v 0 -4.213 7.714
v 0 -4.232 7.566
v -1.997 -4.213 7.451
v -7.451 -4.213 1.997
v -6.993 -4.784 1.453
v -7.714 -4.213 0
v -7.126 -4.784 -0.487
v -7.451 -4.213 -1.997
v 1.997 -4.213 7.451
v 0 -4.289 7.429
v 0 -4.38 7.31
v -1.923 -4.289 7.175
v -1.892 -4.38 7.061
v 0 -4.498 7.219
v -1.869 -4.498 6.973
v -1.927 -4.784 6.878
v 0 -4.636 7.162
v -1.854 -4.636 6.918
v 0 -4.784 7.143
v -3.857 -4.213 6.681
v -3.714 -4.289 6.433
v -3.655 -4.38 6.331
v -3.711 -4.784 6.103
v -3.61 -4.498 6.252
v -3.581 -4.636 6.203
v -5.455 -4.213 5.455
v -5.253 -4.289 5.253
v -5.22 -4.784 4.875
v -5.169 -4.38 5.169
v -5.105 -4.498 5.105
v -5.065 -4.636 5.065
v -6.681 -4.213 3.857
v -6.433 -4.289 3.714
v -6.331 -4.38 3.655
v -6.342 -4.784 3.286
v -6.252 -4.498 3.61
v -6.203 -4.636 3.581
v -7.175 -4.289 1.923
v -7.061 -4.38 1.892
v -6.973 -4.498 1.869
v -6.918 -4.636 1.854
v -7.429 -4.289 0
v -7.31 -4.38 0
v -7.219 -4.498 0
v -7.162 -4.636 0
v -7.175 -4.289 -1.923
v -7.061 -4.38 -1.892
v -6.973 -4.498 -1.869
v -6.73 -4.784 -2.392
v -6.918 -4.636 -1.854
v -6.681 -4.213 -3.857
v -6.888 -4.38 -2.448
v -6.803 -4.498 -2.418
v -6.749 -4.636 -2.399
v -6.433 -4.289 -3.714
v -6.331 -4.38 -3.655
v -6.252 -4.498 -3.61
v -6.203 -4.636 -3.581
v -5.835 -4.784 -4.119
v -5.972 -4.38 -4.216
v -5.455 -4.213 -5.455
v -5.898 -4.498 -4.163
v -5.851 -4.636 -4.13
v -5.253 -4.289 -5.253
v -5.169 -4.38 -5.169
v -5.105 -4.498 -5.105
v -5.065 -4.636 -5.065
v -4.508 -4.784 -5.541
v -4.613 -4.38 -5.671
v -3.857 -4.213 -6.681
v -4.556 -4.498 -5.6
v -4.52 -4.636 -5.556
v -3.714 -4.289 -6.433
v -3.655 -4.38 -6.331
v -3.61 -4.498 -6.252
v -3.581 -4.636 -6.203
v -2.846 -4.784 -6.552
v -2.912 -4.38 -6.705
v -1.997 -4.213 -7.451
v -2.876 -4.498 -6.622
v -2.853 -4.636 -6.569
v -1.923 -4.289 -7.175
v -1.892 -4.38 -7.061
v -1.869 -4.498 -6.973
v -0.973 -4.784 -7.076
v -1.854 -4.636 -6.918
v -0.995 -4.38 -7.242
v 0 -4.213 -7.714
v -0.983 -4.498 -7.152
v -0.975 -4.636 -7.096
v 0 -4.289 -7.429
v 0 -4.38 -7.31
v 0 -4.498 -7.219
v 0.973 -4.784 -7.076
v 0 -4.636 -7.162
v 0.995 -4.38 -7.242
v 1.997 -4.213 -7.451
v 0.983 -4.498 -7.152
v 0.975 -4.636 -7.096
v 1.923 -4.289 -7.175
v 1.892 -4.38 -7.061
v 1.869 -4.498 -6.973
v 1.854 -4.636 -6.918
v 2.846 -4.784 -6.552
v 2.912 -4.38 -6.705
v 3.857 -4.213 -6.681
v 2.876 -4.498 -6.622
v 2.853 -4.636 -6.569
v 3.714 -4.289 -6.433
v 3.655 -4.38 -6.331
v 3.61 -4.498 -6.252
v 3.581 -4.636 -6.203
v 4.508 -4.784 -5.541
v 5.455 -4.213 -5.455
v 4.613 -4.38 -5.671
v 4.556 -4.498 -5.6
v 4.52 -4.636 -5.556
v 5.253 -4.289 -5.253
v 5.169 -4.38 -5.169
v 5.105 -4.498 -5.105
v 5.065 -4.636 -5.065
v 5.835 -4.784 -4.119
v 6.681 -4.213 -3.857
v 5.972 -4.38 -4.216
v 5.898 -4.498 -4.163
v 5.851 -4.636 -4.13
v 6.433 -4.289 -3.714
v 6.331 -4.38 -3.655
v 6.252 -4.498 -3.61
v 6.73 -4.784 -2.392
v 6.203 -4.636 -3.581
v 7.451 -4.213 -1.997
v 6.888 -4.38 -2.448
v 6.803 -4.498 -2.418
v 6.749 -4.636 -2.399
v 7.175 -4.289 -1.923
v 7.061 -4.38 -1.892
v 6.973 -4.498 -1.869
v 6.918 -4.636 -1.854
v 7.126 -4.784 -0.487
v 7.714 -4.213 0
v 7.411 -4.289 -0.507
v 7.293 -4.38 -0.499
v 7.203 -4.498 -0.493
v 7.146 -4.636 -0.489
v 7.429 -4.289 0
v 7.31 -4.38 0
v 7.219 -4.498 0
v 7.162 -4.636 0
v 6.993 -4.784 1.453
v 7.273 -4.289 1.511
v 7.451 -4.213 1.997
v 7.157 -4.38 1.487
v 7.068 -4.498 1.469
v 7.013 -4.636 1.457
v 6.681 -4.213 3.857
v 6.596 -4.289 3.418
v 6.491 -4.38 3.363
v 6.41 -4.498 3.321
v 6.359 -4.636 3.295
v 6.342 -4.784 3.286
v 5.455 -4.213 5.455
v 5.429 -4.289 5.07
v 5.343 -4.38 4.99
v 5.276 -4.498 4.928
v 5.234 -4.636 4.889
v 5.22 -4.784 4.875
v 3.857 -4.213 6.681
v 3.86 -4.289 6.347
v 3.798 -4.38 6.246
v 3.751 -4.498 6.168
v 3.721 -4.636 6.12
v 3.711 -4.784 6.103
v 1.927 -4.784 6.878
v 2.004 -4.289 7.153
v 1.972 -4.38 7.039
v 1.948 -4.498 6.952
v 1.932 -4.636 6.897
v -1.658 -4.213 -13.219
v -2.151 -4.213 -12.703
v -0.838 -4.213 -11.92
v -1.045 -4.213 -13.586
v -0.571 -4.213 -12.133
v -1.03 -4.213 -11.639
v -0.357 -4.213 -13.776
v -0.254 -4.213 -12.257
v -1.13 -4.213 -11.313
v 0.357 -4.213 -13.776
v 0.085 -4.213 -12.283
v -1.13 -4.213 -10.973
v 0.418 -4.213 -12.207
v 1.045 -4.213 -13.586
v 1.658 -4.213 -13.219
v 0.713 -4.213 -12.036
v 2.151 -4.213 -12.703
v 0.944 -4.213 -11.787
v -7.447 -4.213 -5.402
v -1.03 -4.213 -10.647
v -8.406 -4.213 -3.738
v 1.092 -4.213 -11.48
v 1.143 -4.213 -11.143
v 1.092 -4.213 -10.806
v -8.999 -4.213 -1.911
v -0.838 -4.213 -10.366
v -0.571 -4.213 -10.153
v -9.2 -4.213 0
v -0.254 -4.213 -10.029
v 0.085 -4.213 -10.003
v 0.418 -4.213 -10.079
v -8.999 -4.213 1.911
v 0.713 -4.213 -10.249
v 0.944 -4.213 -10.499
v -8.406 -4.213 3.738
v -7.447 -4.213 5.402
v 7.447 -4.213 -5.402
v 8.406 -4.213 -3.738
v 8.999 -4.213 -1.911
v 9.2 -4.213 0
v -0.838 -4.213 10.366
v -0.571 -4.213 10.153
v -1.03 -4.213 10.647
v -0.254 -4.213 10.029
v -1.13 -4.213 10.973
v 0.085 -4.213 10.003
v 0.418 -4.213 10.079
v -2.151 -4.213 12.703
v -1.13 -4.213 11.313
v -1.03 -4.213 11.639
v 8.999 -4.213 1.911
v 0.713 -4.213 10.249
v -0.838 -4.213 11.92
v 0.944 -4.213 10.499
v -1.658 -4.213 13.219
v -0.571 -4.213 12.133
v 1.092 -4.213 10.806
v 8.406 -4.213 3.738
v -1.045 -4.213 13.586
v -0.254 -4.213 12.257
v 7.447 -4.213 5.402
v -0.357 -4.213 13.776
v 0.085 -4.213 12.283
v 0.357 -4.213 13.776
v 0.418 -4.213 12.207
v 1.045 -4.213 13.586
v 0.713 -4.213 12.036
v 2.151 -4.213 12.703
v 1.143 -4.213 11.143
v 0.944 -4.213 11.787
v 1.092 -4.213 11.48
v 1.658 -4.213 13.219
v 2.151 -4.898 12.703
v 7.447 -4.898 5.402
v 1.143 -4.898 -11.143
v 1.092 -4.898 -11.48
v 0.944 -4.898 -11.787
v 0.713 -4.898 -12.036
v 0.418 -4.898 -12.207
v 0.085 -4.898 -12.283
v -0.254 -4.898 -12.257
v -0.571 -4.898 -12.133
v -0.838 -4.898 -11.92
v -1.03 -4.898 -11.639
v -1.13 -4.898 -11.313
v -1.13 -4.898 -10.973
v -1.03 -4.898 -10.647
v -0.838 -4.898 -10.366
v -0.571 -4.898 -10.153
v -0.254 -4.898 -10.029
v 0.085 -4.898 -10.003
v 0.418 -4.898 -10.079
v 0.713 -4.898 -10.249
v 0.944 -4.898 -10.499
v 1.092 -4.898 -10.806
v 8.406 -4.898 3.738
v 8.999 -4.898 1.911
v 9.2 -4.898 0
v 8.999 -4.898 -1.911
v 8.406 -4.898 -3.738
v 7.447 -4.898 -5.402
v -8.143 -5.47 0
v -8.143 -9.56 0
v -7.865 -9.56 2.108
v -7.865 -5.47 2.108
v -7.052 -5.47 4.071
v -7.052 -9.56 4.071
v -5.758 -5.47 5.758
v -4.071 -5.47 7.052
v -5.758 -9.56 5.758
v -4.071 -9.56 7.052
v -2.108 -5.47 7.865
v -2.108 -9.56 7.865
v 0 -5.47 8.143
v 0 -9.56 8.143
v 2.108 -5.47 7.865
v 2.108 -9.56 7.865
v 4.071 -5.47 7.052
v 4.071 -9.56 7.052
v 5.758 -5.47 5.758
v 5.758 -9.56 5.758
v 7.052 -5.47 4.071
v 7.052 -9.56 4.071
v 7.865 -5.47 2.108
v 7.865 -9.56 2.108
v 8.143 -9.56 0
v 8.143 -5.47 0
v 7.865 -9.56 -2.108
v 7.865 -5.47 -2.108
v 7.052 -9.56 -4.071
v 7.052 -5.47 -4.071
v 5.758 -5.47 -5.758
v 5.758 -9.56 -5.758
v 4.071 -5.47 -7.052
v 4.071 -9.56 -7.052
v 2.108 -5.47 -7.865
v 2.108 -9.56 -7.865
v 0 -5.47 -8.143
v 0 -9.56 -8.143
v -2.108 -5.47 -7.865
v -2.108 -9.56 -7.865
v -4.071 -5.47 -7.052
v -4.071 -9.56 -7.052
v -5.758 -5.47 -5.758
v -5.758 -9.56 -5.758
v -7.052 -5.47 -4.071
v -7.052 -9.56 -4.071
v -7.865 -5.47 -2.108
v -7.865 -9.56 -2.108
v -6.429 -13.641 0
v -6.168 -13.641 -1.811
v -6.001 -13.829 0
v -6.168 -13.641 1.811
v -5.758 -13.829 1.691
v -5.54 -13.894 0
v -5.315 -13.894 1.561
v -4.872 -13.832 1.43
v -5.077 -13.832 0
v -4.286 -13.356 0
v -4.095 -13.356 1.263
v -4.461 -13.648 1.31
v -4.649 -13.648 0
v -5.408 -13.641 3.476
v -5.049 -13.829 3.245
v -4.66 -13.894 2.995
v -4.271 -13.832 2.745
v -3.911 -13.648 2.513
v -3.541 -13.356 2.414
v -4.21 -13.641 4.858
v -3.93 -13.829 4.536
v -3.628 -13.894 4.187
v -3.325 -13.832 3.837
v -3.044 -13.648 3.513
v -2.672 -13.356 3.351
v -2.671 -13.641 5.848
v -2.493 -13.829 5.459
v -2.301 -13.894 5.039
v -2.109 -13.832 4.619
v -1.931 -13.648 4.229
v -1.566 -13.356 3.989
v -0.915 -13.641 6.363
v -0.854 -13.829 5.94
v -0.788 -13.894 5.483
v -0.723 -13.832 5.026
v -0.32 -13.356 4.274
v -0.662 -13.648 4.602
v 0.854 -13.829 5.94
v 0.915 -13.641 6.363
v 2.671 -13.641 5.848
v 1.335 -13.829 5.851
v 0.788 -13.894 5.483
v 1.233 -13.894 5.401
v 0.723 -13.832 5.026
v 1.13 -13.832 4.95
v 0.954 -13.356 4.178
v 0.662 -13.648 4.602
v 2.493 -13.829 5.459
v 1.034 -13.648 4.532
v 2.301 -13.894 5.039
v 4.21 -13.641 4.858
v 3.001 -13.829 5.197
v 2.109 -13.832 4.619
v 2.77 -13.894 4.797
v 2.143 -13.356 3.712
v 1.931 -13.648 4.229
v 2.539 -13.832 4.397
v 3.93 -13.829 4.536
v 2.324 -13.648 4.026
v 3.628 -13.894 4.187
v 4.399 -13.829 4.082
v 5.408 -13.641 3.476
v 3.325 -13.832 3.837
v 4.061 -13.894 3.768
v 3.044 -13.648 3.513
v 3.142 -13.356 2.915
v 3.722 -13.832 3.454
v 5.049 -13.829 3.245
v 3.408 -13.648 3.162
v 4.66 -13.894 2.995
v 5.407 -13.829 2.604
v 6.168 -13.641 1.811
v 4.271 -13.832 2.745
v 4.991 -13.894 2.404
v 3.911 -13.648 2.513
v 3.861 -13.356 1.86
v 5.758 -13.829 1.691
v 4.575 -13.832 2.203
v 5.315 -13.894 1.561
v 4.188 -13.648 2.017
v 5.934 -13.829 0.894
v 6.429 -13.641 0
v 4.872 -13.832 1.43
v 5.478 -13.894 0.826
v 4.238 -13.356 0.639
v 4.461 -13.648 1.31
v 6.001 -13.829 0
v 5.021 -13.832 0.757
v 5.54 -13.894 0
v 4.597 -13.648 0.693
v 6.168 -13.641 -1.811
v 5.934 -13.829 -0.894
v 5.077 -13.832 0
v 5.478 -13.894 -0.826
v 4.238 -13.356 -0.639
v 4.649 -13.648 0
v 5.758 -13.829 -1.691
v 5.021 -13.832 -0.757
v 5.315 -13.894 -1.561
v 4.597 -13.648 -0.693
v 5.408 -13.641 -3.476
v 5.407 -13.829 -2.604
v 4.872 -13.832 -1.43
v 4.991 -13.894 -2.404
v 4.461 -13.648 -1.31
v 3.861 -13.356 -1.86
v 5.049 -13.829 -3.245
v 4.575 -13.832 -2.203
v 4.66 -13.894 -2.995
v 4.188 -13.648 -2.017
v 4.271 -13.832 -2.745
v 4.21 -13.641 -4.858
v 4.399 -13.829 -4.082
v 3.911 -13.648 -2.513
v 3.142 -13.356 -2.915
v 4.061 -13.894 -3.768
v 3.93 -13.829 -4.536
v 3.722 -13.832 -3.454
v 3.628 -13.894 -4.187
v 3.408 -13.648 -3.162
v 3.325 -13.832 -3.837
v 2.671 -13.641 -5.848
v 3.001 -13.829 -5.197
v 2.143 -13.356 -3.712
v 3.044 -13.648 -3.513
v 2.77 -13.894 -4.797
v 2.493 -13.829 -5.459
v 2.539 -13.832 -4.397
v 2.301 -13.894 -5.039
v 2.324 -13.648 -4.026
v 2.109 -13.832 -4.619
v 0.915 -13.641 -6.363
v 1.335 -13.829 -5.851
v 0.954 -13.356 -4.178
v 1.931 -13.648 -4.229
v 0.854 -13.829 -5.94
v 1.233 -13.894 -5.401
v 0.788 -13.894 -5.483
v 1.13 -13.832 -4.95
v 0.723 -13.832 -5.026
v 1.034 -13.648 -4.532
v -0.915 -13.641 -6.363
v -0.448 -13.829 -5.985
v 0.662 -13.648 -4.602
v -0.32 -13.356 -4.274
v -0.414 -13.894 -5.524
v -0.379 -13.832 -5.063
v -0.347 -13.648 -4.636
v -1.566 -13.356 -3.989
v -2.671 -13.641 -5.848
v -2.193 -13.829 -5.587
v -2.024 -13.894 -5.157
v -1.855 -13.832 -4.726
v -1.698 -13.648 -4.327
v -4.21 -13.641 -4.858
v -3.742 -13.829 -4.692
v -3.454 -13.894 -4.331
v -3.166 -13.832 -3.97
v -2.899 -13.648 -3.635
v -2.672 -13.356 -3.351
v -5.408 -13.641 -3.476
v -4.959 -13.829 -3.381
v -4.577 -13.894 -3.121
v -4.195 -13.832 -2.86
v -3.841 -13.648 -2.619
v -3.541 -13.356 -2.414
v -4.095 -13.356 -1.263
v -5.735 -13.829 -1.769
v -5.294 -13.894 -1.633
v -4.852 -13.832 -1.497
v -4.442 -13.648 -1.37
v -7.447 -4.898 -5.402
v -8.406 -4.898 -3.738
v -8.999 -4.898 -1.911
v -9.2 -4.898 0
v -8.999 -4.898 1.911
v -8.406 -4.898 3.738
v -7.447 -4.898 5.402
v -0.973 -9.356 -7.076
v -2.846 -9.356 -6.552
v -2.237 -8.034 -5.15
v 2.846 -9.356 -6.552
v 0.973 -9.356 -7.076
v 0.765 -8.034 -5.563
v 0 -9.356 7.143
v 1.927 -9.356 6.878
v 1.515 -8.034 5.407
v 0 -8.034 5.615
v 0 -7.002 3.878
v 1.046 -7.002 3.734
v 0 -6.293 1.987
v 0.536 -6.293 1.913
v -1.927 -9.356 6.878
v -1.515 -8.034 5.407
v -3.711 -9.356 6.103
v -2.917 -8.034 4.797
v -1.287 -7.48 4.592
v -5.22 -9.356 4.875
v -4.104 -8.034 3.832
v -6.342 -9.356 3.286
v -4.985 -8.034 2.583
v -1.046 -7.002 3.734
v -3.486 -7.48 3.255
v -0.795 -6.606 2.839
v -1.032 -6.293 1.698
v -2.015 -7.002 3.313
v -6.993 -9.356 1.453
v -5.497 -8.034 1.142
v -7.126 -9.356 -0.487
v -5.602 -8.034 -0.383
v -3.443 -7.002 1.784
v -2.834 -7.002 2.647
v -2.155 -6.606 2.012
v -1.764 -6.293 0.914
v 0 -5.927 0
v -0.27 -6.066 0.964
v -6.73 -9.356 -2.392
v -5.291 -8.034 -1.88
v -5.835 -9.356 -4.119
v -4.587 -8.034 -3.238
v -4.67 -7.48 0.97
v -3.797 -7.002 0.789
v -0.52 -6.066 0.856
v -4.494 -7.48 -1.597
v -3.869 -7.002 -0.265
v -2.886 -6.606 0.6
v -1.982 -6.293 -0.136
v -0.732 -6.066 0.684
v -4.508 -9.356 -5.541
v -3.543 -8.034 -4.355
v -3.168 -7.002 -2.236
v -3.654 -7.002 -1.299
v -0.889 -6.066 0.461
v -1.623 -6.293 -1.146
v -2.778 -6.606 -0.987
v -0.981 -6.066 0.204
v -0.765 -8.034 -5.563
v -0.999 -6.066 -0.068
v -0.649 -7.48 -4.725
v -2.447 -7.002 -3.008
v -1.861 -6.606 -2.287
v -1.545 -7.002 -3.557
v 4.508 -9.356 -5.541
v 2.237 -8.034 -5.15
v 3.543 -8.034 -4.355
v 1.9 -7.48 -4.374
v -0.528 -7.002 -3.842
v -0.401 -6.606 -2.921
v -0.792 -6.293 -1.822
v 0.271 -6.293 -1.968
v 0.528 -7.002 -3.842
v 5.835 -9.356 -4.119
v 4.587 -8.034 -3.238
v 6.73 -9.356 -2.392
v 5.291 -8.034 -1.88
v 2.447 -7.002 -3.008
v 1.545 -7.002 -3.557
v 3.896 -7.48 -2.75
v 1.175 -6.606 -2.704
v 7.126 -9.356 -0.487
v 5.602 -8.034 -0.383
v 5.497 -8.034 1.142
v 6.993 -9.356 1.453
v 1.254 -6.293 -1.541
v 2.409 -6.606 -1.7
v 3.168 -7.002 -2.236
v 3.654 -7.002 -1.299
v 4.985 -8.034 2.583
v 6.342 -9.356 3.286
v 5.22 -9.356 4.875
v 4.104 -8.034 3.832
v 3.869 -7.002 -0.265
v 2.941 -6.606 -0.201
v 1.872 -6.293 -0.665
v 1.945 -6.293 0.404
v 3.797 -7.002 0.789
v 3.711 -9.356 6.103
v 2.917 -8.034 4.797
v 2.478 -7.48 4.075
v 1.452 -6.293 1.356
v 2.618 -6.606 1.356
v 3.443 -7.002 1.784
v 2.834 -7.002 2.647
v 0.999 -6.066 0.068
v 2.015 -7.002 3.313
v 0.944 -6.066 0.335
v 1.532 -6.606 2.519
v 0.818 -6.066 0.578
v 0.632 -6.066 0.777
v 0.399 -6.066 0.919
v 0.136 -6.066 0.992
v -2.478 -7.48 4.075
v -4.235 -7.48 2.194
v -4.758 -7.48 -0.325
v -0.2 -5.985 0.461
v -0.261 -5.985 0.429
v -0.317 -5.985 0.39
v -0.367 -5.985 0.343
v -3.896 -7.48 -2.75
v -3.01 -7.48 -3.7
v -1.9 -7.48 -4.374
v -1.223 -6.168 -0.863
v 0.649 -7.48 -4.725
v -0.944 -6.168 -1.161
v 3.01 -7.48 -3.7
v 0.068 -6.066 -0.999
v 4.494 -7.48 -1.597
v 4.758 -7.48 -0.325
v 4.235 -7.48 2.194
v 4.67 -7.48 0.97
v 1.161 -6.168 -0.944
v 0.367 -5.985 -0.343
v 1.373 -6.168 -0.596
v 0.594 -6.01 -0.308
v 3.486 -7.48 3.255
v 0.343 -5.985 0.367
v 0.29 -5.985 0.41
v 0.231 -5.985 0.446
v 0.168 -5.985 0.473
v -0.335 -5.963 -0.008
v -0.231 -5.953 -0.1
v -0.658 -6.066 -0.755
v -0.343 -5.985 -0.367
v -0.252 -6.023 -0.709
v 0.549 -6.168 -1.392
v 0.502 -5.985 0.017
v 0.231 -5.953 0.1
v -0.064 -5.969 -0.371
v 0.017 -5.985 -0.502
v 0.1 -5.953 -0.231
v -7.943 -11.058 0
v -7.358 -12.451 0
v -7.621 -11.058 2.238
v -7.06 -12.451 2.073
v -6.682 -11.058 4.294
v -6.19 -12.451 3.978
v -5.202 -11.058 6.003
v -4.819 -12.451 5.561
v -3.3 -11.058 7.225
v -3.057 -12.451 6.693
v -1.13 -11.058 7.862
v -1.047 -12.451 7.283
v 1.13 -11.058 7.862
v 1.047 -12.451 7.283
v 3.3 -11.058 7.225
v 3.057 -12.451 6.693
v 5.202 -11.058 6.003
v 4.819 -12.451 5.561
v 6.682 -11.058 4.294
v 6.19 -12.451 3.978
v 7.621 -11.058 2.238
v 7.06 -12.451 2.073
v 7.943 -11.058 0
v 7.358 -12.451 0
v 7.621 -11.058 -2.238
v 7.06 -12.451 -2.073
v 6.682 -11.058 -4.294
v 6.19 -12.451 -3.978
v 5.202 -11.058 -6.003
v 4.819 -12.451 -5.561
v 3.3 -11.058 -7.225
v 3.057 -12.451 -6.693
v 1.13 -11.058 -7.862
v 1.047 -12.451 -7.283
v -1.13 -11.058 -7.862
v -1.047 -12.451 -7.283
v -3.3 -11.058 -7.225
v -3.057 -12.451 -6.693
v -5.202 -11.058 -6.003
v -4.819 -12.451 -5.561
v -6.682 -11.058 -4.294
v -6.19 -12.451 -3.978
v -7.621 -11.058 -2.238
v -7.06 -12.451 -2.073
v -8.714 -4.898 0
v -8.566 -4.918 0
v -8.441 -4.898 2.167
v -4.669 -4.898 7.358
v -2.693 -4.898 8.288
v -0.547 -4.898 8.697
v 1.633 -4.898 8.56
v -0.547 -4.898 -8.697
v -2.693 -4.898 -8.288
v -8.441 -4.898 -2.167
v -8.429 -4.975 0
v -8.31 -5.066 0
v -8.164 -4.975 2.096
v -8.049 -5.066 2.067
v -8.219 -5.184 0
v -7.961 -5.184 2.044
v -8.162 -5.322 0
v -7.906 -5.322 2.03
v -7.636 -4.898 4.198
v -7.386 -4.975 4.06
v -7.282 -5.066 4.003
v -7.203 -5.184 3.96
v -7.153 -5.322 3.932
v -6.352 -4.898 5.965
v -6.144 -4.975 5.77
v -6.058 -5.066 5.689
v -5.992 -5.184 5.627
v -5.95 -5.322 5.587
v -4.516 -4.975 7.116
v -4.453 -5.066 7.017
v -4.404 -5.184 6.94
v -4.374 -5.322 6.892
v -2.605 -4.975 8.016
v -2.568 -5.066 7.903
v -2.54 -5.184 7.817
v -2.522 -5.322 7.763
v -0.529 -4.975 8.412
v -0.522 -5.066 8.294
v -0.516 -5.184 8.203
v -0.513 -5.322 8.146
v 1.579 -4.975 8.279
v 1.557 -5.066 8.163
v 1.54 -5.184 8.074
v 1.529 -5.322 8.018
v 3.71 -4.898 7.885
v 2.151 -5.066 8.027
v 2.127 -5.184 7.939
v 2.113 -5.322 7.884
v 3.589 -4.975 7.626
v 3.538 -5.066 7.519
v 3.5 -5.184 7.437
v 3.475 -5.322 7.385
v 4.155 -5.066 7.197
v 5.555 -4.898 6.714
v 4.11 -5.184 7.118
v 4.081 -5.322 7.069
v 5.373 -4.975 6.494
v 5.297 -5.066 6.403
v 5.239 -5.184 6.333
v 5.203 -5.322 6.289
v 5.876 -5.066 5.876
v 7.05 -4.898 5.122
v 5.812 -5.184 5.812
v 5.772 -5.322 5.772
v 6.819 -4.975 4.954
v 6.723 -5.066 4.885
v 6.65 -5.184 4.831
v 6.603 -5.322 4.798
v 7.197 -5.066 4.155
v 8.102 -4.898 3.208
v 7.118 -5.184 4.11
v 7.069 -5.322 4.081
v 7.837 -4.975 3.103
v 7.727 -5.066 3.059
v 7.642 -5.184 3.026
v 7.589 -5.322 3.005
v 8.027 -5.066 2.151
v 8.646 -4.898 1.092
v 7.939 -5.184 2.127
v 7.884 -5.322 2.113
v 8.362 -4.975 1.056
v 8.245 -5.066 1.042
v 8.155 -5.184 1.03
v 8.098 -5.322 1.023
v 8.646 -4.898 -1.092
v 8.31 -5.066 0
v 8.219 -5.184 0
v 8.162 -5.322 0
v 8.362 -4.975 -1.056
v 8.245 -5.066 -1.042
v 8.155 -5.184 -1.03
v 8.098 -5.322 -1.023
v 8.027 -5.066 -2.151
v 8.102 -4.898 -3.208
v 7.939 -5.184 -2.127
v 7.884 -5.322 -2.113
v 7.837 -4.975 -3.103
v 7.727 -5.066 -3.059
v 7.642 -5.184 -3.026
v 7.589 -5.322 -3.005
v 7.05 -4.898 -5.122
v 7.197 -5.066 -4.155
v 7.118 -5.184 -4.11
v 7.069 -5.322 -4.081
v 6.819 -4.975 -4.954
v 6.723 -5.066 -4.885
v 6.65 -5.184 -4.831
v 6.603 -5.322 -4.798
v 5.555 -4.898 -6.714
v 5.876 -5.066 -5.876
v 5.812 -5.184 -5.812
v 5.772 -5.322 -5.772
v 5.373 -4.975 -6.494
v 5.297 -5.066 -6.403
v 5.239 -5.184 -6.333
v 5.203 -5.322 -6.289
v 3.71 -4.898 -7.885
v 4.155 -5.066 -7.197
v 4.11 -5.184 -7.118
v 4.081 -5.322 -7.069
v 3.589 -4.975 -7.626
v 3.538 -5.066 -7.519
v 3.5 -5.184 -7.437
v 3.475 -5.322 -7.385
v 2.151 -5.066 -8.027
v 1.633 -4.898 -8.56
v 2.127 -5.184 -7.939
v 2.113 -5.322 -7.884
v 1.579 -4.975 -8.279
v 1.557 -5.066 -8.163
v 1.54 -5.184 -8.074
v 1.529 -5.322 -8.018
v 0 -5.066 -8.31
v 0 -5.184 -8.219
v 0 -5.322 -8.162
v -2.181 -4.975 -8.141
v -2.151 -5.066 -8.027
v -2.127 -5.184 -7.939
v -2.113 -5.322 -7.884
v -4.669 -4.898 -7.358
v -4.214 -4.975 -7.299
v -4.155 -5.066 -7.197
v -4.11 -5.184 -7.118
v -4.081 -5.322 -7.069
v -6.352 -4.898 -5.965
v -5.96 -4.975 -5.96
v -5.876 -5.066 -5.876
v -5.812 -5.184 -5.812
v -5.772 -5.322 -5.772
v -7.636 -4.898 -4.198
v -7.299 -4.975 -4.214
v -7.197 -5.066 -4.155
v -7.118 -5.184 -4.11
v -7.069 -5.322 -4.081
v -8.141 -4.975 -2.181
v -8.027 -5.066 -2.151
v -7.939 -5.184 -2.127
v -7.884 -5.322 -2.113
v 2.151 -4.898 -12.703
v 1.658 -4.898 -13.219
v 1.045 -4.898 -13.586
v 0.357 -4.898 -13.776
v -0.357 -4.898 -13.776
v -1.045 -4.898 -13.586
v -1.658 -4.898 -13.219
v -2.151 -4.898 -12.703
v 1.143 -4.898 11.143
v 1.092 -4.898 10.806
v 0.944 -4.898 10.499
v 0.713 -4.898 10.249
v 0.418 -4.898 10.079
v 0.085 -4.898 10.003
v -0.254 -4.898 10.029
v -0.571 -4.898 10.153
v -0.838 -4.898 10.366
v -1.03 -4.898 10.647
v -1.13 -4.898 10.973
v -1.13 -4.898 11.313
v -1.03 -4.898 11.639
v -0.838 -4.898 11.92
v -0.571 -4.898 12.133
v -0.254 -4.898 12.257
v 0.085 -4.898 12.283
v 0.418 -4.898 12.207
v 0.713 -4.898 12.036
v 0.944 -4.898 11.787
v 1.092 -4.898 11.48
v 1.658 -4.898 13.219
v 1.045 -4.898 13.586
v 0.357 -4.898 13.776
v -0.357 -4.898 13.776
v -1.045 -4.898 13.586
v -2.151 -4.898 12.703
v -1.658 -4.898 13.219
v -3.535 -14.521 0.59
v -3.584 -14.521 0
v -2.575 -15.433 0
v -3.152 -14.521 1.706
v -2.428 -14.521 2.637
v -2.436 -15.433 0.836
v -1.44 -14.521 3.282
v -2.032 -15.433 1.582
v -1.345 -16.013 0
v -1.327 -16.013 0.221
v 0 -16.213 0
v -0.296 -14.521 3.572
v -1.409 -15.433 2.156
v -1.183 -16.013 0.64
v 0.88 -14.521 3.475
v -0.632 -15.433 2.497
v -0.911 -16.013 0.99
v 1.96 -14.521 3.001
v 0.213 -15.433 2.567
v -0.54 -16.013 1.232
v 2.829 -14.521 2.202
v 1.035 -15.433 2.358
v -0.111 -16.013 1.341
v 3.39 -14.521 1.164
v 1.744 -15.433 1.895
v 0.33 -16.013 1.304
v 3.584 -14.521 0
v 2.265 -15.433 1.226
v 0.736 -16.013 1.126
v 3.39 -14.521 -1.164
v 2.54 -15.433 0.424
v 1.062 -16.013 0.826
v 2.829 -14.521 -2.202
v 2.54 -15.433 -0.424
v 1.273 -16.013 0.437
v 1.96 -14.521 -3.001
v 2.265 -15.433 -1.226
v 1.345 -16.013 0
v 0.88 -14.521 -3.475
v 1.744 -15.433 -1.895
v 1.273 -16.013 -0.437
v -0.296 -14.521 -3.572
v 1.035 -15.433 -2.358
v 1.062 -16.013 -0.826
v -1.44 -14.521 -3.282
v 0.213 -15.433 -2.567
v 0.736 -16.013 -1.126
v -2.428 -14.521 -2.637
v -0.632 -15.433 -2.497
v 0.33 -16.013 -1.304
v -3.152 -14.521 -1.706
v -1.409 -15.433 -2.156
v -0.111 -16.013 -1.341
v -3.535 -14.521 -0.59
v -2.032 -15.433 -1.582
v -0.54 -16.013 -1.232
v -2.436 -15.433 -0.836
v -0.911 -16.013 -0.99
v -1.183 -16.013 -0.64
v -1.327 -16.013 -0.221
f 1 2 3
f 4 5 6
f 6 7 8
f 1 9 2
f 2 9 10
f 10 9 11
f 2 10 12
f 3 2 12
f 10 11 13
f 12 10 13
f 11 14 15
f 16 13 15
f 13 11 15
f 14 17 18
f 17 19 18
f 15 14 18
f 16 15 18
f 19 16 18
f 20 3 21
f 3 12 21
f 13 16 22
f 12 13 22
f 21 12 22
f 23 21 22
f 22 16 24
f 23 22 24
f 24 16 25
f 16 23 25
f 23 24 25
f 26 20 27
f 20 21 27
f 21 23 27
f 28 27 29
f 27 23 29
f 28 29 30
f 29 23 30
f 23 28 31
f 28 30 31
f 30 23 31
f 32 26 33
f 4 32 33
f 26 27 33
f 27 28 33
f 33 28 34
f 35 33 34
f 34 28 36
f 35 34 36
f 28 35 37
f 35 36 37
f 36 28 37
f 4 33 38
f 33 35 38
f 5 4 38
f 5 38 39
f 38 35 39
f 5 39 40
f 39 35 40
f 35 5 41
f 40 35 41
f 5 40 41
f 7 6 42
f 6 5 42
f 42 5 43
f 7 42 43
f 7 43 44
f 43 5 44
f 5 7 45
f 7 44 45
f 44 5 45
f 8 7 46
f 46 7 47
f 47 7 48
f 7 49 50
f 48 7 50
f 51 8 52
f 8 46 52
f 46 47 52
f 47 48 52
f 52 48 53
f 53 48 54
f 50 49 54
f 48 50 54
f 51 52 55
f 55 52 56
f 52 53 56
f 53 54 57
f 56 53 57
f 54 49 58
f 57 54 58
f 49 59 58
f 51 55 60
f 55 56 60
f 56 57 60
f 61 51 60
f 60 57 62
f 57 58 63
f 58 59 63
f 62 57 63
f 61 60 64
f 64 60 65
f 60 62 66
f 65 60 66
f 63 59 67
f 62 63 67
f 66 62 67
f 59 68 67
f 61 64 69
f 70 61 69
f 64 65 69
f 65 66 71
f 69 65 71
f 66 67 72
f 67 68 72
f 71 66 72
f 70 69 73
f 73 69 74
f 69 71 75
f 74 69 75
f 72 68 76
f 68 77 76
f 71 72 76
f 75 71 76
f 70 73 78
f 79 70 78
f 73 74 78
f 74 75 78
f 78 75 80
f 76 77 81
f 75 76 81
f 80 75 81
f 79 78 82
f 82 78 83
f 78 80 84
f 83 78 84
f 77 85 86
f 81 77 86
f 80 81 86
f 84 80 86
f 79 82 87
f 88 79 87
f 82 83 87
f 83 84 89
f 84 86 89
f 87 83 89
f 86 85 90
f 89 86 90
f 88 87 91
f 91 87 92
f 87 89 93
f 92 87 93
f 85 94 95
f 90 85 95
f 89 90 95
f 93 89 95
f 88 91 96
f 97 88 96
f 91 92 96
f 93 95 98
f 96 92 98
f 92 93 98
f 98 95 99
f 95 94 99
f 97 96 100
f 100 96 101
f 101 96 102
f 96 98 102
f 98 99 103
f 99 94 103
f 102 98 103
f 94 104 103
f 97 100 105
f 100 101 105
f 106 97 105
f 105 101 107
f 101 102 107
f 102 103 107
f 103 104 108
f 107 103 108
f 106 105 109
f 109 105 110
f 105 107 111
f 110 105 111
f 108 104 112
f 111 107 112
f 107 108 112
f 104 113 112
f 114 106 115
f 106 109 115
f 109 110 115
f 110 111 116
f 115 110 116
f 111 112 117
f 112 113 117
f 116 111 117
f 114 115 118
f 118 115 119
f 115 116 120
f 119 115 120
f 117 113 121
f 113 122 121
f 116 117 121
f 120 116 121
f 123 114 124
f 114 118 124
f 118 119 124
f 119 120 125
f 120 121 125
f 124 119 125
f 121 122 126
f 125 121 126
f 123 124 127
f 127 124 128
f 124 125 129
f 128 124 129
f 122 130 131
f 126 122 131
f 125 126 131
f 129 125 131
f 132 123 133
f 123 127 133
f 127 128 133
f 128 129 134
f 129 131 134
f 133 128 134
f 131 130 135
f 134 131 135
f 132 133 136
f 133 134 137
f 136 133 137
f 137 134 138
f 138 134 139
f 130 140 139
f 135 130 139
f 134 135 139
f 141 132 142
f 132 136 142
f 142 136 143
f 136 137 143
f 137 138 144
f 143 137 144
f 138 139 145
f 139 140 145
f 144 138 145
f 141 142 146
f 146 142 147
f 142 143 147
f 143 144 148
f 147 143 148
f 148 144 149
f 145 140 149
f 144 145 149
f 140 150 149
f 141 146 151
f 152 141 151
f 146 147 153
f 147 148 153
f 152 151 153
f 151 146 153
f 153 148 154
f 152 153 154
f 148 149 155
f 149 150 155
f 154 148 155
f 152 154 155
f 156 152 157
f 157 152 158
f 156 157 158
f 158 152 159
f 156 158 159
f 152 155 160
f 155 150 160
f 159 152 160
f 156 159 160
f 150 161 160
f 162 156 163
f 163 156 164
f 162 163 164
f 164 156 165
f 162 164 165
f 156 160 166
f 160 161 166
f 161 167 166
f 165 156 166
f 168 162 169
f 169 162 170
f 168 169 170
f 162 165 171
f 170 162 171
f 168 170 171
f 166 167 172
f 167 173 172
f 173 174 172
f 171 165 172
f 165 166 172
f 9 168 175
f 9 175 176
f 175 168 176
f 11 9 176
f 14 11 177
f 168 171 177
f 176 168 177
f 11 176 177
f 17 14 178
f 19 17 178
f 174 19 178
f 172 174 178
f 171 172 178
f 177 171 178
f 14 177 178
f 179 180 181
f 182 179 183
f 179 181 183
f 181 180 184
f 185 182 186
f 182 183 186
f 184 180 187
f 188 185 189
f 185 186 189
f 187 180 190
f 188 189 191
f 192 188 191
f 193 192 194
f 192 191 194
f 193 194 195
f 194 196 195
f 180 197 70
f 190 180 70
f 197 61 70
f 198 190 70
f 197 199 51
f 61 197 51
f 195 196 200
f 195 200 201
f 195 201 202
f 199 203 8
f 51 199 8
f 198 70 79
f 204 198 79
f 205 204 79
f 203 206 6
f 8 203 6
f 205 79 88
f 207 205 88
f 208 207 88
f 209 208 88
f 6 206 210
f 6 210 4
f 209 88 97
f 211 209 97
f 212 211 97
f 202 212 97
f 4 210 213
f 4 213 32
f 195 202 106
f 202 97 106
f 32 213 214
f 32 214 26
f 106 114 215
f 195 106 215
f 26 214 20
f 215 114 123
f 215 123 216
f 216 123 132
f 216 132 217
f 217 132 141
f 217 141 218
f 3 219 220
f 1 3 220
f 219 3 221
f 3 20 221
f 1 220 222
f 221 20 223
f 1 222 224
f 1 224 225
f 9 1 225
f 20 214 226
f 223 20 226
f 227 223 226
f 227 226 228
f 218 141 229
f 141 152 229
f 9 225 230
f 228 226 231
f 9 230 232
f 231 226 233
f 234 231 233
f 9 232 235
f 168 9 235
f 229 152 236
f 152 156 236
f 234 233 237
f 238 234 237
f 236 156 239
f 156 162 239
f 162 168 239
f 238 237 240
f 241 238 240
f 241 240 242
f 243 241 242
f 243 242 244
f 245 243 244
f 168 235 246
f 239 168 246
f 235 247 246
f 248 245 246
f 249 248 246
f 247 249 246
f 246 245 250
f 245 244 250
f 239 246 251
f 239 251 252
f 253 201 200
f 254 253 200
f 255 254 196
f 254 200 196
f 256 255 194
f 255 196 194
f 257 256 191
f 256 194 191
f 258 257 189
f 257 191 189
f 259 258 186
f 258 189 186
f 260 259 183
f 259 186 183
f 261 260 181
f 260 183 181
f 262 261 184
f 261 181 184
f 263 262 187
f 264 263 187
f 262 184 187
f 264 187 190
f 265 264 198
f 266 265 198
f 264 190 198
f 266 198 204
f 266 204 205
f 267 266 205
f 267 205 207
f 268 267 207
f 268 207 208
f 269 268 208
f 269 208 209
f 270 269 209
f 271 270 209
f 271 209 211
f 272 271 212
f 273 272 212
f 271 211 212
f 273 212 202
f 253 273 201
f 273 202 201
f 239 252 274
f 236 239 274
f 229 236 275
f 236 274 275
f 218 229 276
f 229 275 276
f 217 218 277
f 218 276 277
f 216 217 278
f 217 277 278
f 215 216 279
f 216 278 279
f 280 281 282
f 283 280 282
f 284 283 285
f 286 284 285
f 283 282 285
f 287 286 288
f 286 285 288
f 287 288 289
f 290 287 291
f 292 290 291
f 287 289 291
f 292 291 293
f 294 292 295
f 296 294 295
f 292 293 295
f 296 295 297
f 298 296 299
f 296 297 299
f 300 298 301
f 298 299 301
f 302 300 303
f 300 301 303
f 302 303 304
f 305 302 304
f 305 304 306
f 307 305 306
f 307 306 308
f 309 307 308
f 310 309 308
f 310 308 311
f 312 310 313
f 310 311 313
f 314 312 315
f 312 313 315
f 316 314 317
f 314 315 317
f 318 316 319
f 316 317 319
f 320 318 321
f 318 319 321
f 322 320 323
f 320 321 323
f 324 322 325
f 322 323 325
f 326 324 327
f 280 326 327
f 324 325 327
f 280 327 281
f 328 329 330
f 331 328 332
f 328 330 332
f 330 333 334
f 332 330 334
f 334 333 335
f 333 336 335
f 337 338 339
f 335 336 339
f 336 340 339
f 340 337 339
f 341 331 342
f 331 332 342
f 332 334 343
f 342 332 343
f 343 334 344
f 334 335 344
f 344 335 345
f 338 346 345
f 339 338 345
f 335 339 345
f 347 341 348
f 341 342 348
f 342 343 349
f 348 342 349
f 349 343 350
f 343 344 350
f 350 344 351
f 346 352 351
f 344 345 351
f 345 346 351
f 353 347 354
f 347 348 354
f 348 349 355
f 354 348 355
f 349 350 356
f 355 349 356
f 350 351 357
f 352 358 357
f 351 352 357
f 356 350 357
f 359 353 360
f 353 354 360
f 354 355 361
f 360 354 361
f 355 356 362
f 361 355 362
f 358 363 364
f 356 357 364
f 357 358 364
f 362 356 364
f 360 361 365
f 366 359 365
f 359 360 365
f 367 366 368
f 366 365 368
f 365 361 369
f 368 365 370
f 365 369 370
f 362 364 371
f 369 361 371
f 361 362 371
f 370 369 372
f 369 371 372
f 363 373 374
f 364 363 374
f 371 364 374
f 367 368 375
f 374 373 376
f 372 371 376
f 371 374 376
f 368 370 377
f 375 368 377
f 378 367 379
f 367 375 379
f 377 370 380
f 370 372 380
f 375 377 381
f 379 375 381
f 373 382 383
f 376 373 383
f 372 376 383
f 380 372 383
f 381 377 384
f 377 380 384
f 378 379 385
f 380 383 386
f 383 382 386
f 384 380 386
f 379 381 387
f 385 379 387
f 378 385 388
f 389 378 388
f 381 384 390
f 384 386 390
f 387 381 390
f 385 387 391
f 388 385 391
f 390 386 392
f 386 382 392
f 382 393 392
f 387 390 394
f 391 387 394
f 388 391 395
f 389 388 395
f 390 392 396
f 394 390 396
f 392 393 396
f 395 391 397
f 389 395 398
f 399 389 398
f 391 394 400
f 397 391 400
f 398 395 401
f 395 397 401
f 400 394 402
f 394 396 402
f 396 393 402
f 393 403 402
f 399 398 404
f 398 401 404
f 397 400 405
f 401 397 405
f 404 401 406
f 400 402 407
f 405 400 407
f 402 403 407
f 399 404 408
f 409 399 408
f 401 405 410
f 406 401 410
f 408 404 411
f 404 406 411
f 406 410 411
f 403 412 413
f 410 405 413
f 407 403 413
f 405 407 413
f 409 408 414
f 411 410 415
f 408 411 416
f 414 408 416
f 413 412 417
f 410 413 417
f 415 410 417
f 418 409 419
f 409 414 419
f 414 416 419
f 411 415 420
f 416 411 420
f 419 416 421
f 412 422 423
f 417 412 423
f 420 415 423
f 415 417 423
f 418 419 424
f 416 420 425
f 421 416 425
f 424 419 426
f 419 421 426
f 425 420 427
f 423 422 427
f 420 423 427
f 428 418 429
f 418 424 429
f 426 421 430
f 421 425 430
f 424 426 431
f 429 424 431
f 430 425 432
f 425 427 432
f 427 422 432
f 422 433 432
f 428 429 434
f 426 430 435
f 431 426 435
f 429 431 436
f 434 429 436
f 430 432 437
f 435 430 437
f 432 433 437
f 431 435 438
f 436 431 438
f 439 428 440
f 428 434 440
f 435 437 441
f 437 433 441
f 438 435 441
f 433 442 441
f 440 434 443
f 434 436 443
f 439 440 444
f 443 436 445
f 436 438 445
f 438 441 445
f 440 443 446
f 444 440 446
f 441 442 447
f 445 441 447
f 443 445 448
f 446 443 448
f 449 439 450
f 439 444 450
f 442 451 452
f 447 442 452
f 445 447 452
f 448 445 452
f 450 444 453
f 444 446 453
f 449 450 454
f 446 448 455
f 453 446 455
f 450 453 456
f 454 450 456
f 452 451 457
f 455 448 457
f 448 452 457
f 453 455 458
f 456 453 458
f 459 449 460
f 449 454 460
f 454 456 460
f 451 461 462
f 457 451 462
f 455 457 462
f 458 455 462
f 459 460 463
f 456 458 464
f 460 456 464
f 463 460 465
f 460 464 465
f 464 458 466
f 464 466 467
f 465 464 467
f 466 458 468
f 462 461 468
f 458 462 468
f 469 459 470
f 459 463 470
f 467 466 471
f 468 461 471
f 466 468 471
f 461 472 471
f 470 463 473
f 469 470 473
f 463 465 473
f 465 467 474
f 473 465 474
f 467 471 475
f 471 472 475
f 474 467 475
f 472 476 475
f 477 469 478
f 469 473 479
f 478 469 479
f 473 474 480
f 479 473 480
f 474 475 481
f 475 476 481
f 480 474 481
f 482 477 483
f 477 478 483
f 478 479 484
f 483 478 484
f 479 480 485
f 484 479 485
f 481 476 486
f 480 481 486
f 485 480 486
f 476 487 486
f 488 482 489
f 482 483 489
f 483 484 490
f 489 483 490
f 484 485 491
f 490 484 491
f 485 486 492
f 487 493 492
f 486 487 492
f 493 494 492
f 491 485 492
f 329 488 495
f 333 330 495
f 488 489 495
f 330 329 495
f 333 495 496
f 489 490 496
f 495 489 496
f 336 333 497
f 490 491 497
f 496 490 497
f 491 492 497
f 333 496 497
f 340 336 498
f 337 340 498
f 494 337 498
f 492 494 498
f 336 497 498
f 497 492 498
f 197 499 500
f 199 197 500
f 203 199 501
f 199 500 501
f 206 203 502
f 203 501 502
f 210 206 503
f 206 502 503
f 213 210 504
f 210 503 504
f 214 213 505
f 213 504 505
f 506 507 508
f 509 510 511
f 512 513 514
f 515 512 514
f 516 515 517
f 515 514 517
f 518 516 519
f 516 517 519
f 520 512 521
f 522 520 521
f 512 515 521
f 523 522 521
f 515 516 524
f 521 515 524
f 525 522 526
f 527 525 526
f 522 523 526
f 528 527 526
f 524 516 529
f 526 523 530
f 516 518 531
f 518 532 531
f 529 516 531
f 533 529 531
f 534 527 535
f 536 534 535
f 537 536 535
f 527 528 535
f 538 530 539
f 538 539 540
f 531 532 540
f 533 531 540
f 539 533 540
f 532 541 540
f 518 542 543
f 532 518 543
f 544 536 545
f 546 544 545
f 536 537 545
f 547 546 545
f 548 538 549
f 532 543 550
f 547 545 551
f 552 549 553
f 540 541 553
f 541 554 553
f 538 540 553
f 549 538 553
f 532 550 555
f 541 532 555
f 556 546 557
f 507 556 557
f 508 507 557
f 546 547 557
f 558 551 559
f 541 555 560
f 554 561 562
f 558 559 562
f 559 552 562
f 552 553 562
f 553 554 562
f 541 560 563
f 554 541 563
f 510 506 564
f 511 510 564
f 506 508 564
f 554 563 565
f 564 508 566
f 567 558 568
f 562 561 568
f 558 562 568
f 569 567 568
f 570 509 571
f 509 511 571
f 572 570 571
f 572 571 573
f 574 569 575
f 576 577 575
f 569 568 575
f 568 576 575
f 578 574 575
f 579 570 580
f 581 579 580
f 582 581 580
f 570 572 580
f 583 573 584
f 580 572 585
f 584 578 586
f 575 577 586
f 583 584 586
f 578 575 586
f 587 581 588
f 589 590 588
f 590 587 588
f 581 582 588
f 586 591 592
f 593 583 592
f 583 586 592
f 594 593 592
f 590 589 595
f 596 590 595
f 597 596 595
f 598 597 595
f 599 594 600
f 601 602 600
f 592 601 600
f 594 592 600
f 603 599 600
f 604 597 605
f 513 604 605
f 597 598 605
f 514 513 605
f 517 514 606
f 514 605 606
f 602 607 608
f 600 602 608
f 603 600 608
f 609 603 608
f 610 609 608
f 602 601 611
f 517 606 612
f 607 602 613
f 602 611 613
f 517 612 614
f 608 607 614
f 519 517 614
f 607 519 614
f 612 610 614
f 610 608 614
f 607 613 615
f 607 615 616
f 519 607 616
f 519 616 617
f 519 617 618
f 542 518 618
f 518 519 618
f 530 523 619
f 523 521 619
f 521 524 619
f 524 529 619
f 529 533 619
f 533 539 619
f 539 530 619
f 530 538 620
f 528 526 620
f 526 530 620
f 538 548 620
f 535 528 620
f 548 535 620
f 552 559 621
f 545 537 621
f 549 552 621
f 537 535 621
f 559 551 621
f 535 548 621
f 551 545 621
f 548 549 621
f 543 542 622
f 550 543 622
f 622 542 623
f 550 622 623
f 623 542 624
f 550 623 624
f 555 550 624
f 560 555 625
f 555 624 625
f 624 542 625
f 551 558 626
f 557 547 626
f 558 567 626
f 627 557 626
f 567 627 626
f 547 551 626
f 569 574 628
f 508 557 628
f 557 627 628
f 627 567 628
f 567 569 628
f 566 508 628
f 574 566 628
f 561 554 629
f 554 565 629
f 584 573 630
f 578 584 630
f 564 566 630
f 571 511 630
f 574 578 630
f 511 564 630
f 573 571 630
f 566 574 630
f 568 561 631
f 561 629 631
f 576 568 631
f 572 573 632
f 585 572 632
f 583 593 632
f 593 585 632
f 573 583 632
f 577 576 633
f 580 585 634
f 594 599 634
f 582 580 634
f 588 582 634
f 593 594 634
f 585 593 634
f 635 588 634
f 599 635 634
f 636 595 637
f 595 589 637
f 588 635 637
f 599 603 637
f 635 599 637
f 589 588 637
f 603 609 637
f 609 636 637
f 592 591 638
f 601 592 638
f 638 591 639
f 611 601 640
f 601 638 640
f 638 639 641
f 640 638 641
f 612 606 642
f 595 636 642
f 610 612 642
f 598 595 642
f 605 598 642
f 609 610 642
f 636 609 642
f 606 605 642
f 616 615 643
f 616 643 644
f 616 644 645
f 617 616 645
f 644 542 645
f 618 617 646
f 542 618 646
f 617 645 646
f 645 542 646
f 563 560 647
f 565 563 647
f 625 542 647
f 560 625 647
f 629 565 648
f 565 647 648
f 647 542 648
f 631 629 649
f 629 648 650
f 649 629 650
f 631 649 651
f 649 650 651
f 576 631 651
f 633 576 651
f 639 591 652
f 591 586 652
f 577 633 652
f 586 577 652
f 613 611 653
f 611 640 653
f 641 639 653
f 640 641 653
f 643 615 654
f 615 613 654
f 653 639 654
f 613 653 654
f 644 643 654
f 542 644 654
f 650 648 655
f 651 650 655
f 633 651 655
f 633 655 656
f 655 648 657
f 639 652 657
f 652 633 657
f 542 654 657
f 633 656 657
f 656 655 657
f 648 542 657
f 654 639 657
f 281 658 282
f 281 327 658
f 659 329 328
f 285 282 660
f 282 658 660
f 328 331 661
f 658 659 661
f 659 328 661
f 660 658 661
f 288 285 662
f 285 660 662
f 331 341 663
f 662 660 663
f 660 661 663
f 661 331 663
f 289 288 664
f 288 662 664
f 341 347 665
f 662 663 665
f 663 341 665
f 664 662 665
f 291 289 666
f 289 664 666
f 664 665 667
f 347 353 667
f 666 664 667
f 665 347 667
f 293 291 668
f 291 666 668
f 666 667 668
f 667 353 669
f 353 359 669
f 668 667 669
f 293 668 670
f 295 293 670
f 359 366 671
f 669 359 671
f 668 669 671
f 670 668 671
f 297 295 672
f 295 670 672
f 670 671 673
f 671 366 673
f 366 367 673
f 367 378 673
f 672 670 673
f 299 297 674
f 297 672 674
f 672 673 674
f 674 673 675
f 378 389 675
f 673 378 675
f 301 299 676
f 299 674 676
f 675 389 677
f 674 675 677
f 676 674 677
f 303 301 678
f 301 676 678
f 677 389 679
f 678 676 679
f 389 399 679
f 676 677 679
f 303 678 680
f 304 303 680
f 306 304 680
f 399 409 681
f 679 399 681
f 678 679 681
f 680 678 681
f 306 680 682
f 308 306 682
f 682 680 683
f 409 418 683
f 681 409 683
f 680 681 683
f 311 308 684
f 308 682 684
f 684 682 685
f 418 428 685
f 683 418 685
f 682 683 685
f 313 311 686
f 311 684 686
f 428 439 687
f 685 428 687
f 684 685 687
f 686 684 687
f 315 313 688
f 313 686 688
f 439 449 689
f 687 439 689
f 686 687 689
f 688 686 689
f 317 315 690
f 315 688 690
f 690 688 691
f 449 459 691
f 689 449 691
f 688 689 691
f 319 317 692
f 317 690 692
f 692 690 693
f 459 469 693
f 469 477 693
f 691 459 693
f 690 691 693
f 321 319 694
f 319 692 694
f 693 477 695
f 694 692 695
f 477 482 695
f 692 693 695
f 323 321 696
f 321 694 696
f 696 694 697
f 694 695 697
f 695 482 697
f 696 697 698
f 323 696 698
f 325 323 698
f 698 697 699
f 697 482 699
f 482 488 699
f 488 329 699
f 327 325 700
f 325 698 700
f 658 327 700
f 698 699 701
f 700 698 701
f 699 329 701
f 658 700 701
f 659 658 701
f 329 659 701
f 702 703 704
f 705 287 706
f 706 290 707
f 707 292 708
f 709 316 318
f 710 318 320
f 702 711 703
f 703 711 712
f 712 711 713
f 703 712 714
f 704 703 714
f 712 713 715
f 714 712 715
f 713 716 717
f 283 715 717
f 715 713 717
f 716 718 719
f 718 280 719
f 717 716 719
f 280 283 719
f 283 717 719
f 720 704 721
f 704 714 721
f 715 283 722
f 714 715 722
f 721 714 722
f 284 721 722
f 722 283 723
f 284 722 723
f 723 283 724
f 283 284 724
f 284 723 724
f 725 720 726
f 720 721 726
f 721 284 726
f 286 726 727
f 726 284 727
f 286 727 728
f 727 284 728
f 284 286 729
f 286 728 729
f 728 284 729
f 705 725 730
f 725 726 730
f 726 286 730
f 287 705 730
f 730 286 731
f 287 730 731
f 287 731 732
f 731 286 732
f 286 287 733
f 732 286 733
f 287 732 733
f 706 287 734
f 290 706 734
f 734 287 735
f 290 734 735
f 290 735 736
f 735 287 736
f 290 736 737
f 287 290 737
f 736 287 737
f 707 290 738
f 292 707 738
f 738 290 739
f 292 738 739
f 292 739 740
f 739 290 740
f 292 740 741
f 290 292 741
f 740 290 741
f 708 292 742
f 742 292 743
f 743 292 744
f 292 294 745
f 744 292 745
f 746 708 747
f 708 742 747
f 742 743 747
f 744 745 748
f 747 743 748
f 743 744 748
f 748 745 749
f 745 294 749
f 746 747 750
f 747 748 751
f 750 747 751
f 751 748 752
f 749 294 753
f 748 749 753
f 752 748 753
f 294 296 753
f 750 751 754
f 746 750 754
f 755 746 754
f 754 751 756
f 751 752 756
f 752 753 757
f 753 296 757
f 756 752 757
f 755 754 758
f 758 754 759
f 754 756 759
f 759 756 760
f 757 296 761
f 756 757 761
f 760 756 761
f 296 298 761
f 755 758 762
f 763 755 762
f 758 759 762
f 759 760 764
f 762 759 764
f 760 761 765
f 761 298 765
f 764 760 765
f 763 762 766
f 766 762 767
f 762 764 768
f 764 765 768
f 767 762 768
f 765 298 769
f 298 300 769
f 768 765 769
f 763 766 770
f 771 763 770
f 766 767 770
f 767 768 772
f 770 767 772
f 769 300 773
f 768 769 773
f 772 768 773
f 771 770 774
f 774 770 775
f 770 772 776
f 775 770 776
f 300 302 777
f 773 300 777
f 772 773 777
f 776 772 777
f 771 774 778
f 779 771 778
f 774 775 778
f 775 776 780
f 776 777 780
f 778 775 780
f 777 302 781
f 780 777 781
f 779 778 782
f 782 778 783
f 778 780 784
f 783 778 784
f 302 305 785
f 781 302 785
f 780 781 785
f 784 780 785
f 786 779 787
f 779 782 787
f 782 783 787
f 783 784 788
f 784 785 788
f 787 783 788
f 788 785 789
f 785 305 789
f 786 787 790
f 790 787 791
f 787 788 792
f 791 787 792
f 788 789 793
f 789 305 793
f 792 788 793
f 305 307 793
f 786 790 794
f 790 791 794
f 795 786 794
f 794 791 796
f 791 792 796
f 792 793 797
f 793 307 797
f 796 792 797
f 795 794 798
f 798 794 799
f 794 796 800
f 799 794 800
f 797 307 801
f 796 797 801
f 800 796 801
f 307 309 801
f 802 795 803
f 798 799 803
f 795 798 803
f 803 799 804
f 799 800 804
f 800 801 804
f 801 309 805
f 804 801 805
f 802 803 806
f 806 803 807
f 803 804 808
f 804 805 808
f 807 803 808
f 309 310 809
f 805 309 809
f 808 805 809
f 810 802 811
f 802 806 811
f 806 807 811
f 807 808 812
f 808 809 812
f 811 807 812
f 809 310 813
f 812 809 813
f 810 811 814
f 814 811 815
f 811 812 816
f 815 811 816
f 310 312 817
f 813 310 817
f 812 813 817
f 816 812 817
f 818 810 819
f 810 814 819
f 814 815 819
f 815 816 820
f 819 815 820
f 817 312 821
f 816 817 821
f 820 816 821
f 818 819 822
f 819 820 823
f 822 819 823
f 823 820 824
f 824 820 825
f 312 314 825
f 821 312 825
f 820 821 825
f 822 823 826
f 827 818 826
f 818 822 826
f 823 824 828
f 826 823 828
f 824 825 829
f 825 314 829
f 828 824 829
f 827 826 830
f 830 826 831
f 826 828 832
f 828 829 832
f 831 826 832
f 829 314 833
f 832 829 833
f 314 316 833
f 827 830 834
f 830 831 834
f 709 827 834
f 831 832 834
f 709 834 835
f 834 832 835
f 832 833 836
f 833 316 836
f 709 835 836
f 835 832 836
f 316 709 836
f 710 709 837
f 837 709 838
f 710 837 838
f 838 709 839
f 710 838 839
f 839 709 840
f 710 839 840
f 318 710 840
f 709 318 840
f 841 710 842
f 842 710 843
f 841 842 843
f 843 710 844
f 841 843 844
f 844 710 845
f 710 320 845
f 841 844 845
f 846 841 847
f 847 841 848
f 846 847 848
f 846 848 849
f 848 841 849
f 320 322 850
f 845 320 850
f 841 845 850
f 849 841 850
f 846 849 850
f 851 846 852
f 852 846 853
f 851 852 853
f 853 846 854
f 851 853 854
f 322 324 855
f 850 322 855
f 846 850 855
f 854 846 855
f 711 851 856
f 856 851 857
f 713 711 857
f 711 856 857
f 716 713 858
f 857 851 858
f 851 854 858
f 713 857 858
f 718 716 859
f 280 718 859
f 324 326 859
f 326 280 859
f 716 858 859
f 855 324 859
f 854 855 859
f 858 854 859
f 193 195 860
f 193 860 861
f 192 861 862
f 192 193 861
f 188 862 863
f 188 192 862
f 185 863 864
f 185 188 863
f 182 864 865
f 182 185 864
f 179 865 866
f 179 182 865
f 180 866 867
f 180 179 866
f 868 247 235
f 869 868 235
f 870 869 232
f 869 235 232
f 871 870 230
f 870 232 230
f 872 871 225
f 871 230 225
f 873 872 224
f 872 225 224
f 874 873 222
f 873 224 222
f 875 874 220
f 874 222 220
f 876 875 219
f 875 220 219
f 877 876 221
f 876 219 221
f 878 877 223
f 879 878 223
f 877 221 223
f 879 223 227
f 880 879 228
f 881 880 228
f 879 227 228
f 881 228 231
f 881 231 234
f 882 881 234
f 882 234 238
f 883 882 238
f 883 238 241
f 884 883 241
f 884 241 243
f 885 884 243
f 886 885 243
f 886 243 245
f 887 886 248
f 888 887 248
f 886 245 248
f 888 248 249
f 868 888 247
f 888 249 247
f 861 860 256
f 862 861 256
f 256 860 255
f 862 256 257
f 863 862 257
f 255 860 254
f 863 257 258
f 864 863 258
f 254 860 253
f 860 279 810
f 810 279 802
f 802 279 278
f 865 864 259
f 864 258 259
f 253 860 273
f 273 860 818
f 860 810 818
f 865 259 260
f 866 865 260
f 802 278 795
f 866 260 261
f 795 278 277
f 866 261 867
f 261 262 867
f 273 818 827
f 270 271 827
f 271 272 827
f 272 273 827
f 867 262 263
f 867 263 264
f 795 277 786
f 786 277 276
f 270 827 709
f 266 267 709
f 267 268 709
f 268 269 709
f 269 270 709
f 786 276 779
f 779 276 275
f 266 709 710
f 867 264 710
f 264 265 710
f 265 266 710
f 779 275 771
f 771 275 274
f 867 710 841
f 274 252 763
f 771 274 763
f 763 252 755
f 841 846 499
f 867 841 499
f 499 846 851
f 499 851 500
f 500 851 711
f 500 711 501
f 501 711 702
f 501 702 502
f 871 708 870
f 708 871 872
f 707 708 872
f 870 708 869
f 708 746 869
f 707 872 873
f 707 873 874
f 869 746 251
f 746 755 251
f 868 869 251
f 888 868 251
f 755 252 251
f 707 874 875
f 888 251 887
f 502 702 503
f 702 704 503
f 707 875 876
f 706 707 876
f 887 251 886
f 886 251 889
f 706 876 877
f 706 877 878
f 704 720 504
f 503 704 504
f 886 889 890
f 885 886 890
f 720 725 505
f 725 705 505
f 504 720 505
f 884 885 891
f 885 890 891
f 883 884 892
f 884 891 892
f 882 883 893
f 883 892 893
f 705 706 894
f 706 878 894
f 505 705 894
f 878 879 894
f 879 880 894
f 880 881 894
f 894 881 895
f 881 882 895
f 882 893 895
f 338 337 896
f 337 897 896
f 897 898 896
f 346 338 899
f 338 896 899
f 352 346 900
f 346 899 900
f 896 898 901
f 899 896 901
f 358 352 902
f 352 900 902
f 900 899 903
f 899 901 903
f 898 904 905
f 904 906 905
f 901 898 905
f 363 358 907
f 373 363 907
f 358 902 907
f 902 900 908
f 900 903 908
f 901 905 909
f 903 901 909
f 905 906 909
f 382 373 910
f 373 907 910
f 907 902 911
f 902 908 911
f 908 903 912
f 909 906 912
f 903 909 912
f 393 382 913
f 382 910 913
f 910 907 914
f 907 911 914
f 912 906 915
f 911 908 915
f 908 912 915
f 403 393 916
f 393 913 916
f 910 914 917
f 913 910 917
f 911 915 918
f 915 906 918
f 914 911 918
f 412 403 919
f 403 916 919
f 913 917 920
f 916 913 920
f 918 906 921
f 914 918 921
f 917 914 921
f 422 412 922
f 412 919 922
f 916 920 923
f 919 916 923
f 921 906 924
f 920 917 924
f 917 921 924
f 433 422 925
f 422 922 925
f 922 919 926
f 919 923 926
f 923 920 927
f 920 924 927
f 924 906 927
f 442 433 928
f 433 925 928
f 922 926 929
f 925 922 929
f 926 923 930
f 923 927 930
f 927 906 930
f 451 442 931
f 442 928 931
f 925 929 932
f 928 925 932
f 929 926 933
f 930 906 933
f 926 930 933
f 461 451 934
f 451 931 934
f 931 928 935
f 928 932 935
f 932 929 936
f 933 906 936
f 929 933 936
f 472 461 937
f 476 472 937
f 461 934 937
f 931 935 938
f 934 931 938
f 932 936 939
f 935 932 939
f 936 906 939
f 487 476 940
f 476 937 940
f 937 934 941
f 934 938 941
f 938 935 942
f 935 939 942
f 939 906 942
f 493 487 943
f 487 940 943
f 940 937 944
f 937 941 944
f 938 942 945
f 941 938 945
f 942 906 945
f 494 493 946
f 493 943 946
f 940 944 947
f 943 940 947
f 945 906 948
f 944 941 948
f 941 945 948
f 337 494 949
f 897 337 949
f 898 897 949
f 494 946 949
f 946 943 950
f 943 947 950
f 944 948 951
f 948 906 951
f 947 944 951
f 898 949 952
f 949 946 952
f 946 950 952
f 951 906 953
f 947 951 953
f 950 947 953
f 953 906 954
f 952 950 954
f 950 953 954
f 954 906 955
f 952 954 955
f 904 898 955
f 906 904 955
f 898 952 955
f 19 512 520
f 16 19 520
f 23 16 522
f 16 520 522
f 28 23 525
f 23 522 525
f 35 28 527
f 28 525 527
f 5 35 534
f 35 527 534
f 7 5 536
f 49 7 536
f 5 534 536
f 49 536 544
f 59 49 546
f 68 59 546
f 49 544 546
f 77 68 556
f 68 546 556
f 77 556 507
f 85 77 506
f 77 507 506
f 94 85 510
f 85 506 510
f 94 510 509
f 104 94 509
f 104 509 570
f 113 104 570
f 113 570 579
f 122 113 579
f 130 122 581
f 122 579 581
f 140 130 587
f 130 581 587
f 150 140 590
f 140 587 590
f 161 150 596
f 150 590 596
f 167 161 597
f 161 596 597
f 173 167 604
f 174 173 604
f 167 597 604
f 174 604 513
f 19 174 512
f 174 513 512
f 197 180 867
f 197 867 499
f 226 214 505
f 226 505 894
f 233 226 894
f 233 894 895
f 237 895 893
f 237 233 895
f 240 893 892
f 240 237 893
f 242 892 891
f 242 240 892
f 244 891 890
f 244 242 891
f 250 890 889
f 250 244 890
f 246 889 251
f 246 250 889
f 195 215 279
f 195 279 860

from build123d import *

# Parameters (mm, degrees)
ESBO_O2_R                = 2
RESSALTO_EXTRUS_O1_DEPTH = 1.2
FILETE1_R                = 1
FILETE2_R                = 1
ESCALA1_SCALE            = 0.571428571


with BuildPart() as part:
    # Esboço1 → Revolução1 (revolve)
    with BuildSketch(Plane.XY):
        with BuildLine():
            Line((0, 0), (-16.1, 0))
            Line((-16.1, 0), (-16.1, -1.2))
            Line((-16.1, -1.2), (-14.25, -1.2))
            Line((-14.25, -1.2), (-14.25, -9.358571571))
            ThreePointArc((-14.25, -9.358571571), (-13.469544457, -13.231554918), (-11.25, -16.5))
            ThreePointArc((-11.25, -16.5), (-9.286251005, -16.915617464), (-7.5, -16))
            ThreePointArc((-7.5, -16), (-4.506939094, -19.635408641), (0, -21))
            Line((0, -21), (0, 0))
        make_face()
    revolve(axis=Axis((0, 0, 0), (0, 1, 0)))

    # Esboço2 → Ressalto-extrusão1 (add)
    with BuildSketch(Plane(origin=(0, 0, 0), x_dir=(1, 0, 0), z_dir=(0, 1, 0))):
        with BuildLine():
            Line((13.032253871, 9.453589744), (3.763973944, 22.230384615))
            ThreePointArc((3.763973944, 22.230384615), (0, 24.15), (-3.763973944, 22.230384615))
            Line((-3.763973944, 22.230384615), (-13.032253871, 9.453589744))
            ThreePointArc((-13.032253871, 9.453589744), (0, 16.1), (13.032253871, 9.453589744))
        make_face()
        with Locations((0, 19.5)):
            Circle(ESBO_O2_R, mode=Mode.SUBTRACT)
        with BuildLine():
            Line((3.763973944, -22.230384615), (13.032253871, -9.453589744))
            ThreePointArc((13.032253871, -9.453589744), (0, -16.1), (-13.032253871, -9.453589744))
            Line((-13.032253871, -9.453589744), (-3.763973944, -22.230384615))
            ThreePointArc((-3.763973944, -22.230384615), (0, -24.15), (3.763973944, -22.230384615))
        make_face()
        with Locations((0, -19.5)):
            Circle(ESBO_O2_R, mode=Mode.SUBTRACT)
    extrude(amount=-RESSALTO_EXTRUS_O1_DEPTH)

    # Esboço3 → Corte-Revolução1 (revolve, cut)
    with BuildSketch(Plane(origin=(0, 0, 0), x_dir=(0, 0, -1), z_dir=(1, 0, 0))):
        with BuildLine():
            Line((-12.5, 0), (-12.5, -9))
            ThreePointArc((-12.5, -9), (-6.786587677, -4.882109006), (0, -3))
            Line((0, -3), (0, 0))
            Line((0, 0), (-12.5, 0))
        make_face()
    revolve(axis=Axis((0, 0, 0), (0, -1, 0)), mode=Mode.SUBTRACT)

    # Filete1
    filete1_edges = [part.edges().sort_by_distance(p)[0] for p in [
        (0, 0, -12.5),
    ]]
    fillet(filete1_edges, radius=FILETE1_R)

    # Filete2
    filete2_edges = [part.edges().sort_by_distance(p)[0] for p in [
        (14.25, -1.2, 0),
    ]]
    fillet(filete2_edges, radius=FILETE2_R)


with BuildPart() as part_1:
    # Escala1: scaled about (0, -9.829669645, 0)
    add(part.part.scale(ESCALA1_SCALE).moved(Location((0, -4.212715562, 0))))


solid = part_1.part
